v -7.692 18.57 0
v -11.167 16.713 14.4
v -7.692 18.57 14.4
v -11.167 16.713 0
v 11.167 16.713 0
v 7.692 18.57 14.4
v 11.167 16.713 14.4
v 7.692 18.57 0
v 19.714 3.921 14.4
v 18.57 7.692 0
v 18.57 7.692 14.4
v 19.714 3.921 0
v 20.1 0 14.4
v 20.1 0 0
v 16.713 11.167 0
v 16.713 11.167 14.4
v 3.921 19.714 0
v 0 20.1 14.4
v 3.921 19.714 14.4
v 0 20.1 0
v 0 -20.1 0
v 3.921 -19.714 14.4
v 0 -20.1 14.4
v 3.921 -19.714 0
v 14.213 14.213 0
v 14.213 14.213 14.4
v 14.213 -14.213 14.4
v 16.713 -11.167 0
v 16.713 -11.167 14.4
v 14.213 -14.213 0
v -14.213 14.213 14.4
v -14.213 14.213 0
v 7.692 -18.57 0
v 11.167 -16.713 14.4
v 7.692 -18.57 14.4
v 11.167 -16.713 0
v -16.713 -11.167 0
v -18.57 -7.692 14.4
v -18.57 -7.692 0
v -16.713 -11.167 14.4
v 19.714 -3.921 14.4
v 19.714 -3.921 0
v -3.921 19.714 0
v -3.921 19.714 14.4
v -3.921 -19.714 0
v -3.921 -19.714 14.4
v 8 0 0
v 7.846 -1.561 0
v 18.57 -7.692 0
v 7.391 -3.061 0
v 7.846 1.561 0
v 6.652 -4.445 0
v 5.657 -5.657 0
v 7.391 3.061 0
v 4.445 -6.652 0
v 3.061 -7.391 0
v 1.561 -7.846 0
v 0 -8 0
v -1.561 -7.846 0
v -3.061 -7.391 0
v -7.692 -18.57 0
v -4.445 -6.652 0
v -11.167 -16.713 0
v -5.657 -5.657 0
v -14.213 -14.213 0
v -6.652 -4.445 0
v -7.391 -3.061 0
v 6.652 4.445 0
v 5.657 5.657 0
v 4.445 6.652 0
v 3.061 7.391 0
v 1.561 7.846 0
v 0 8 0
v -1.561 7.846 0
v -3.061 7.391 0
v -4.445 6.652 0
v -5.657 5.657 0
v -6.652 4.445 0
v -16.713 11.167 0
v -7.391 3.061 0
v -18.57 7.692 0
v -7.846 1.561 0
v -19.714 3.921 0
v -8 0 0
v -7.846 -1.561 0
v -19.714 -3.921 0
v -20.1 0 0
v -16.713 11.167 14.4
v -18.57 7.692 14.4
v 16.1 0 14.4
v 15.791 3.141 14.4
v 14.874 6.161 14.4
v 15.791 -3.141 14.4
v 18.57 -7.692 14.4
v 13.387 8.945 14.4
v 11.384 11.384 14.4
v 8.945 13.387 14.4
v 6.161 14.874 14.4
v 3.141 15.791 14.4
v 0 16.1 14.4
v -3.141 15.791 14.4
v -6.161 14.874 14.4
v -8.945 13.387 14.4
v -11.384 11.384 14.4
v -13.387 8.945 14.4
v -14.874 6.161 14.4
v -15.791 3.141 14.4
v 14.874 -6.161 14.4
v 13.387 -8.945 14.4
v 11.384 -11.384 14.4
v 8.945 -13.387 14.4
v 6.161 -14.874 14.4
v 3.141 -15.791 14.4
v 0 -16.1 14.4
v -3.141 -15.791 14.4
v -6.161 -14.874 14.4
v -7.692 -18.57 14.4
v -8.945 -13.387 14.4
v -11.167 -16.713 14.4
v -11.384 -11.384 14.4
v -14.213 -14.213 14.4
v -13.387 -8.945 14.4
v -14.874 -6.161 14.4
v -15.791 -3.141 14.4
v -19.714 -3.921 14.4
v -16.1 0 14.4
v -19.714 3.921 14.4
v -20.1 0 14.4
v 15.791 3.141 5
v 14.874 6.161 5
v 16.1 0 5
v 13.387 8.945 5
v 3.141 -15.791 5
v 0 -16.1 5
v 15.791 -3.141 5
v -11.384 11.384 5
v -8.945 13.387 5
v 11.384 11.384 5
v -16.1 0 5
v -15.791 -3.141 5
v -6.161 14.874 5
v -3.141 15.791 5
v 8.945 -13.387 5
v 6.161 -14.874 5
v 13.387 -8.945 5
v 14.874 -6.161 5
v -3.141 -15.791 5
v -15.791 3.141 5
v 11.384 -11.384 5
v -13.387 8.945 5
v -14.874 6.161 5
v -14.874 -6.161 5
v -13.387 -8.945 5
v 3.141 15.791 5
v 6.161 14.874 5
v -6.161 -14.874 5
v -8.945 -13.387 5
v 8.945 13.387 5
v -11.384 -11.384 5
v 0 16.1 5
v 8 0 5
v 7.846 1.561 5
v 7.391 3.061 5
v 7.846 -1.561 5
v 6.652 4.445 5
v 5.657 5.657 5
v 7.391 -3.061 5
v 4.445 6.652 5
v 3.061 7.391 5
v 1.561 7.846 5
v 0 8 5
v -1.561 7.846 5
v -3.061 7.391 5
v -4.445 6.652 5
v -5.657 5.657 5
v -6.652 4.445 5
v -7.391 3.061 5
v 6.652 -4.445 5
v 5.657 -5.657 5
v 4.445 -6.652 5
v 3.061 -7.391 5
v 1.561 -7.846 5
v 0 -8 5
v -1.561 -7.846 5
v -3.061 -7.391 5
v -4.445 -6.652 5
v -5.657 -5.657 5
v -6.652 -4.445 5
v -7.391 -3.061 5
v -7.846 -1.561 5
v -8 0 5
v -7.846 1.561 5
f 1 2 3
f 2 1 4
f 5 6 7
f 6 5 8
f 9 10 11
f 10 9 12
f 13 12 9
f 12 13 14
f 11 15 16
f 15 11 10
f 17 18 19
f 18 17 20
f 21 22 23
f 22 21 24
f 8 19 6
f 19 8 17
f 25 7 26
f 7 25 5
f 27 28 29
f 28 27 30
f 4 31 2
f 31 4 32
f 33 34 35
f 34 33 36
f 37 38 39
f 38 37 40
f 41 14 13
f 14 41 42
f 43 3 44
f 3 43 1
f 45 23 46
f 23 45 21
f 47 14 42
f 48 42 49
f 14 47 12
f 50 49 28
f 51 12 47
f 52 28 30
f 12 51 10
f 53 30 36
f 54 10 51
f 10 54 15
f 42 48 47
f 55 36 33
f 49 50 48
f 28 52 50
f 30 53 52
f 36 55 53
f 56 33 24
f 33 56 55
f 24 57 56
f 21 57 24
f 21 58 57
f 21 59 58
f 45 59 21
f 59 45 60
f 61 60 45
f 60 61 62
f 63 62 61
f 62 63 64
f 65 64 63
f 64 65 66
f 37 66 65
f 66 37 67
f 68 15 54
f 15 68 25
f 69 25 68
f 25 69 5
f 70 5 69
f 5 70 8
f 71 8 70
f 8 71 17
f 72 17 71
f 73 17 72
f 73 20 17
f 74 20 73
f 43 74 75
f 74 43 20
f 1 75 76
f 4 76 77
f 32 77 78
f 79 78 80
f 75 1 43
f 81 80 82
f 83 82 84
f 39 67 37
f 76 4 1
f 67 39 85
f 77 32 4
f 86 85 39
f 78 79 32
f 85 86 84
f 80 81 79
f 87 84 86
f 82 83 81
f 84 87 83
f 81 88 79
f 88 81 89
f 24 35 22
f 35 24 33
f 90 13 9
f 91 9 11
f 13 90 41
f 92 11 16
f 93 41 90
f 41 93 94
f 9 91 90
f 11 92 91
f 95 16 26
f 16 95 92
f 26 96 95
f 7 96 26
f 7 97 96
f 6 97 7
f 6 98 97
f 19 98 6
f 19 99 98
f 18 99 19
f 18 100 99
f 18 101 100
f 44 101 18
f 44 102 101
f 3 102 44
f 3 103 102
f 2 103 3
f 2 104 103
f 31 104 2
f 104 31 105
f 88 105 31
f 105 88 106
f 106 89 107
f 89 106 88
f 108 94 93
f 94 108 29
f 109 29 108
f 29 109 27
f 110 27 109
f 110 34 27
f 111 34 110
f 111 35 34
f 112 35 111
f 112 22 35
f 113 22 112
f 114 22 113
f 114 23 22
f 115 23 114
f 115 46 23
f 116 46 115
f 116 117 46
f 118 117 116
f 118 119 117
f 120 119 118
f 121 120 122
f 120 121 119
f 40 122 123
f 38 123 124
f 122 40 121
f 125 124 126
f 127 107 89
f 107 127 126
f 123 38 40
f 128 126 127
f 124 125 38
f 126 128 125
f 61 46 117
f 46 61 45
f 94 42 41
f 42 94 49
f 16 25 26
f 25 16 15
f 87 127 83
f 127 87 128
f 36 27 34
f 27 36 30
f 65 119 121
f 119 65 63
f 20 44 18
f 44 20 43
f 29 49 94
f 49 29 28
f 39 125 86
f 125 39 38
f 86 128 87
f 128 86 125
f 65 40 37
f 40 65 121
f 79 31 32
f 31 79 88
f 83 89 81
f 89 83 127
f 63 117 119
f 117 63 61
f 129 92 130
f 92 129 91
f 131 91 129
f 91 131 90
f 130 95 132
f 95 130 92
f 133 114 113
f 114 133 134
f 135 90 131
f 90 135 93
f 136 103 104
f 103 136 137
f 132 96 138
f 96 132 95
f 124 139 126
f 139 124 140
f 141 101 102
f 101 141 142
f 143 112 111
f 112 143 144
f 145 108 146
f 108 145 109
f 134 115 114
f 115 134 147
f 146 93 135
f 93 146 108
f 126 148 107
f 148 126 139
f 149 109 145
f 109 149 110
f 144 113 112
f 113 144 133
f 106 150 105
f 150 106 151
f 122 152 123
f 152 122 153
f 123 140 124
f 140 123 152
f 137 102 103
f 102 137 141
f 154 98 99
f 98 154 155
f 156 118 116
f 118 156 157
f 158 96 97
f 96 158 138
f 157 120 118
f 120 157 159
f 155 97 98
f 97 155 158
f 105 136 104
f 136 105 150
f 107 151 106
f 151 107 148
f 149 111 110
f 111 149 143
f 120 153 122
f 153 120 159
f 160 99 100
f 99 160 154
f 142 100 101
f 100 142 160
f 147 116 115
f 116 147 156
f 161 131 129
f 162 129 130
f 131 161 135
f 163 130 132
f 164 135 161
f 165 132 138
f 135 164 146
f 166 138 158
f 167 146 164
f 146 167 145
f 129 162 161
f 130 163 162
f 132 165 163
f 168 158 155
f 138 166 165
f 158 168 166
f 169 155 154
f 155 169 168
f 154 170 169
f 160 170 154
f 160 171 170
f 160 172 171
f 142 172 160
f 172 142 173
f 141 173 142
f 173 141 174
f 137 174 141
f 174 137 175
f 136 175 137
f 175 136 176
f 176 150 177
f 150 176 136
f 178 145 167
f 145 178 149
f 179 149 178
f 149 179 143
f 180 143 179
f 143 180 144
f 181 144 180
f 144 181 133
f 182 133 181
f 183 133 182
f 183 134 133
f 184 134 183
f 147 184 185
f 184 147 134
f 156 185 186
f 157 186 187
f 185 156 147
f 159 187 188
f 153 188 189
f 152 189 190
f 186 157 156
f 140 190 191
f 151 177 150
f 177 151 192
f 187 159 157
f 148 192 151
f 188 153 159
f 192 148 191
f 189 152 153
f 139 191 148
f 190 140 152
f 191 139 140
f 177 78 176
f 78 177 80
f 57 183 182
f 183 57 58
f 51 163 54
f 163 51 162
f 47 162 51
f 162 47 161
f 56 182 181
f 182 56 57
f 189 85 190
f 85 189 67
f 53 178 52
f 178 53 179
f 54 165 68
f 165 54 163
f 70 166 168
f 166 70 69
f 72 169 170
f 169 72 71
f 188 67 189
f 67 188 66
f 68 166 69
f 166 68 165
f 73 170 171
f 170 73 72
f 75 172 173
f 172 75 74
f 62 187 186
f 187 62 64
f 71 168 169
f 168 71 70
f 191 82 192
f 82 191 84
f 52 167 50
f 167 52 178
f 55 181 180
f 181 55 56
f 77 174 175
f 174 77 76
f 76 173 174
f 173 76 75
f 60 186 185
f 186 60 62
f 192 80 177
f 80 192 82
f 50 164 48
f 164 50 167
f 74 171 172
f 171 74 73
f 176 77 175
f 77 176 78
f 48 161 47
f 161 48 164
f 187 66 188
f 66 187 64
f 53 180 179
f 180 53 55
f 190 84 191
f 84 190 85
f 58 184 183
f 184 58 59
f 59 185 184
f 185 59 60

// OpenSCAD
$fn = 32;

// ----------------------------------------------------------------------
// Bearing housing: seat for 6002 (32 x 9 mm), 40.2 mm body
// ----------------------------------------------------------------------

// --- parameters (mm) ---
body_od = 40.2;           // housing outside diameter
body_h = 14.4;            // overall housing height
wall = 4;                 // wall thickness
pocket_d = 32.2;          // 6002 seat, 0.2 mm clearance
seat_h = 9.4;             // pocket depth
shoulder = 5;             // shoulder under the bearing
pass_d = 16;              // shaft passage

module body() {
  cylinder(h = body_h, d = body_od);
}

difference() {
  union() {
    body();
  }
  translate([0, 0, body_h - seat_h]) cylinder(h = seat_h + 1, d = pocket_d);
  translate([0, 0, -1]) cylinder(h = body_h - seat_h + 1, d = pass_d);
}
